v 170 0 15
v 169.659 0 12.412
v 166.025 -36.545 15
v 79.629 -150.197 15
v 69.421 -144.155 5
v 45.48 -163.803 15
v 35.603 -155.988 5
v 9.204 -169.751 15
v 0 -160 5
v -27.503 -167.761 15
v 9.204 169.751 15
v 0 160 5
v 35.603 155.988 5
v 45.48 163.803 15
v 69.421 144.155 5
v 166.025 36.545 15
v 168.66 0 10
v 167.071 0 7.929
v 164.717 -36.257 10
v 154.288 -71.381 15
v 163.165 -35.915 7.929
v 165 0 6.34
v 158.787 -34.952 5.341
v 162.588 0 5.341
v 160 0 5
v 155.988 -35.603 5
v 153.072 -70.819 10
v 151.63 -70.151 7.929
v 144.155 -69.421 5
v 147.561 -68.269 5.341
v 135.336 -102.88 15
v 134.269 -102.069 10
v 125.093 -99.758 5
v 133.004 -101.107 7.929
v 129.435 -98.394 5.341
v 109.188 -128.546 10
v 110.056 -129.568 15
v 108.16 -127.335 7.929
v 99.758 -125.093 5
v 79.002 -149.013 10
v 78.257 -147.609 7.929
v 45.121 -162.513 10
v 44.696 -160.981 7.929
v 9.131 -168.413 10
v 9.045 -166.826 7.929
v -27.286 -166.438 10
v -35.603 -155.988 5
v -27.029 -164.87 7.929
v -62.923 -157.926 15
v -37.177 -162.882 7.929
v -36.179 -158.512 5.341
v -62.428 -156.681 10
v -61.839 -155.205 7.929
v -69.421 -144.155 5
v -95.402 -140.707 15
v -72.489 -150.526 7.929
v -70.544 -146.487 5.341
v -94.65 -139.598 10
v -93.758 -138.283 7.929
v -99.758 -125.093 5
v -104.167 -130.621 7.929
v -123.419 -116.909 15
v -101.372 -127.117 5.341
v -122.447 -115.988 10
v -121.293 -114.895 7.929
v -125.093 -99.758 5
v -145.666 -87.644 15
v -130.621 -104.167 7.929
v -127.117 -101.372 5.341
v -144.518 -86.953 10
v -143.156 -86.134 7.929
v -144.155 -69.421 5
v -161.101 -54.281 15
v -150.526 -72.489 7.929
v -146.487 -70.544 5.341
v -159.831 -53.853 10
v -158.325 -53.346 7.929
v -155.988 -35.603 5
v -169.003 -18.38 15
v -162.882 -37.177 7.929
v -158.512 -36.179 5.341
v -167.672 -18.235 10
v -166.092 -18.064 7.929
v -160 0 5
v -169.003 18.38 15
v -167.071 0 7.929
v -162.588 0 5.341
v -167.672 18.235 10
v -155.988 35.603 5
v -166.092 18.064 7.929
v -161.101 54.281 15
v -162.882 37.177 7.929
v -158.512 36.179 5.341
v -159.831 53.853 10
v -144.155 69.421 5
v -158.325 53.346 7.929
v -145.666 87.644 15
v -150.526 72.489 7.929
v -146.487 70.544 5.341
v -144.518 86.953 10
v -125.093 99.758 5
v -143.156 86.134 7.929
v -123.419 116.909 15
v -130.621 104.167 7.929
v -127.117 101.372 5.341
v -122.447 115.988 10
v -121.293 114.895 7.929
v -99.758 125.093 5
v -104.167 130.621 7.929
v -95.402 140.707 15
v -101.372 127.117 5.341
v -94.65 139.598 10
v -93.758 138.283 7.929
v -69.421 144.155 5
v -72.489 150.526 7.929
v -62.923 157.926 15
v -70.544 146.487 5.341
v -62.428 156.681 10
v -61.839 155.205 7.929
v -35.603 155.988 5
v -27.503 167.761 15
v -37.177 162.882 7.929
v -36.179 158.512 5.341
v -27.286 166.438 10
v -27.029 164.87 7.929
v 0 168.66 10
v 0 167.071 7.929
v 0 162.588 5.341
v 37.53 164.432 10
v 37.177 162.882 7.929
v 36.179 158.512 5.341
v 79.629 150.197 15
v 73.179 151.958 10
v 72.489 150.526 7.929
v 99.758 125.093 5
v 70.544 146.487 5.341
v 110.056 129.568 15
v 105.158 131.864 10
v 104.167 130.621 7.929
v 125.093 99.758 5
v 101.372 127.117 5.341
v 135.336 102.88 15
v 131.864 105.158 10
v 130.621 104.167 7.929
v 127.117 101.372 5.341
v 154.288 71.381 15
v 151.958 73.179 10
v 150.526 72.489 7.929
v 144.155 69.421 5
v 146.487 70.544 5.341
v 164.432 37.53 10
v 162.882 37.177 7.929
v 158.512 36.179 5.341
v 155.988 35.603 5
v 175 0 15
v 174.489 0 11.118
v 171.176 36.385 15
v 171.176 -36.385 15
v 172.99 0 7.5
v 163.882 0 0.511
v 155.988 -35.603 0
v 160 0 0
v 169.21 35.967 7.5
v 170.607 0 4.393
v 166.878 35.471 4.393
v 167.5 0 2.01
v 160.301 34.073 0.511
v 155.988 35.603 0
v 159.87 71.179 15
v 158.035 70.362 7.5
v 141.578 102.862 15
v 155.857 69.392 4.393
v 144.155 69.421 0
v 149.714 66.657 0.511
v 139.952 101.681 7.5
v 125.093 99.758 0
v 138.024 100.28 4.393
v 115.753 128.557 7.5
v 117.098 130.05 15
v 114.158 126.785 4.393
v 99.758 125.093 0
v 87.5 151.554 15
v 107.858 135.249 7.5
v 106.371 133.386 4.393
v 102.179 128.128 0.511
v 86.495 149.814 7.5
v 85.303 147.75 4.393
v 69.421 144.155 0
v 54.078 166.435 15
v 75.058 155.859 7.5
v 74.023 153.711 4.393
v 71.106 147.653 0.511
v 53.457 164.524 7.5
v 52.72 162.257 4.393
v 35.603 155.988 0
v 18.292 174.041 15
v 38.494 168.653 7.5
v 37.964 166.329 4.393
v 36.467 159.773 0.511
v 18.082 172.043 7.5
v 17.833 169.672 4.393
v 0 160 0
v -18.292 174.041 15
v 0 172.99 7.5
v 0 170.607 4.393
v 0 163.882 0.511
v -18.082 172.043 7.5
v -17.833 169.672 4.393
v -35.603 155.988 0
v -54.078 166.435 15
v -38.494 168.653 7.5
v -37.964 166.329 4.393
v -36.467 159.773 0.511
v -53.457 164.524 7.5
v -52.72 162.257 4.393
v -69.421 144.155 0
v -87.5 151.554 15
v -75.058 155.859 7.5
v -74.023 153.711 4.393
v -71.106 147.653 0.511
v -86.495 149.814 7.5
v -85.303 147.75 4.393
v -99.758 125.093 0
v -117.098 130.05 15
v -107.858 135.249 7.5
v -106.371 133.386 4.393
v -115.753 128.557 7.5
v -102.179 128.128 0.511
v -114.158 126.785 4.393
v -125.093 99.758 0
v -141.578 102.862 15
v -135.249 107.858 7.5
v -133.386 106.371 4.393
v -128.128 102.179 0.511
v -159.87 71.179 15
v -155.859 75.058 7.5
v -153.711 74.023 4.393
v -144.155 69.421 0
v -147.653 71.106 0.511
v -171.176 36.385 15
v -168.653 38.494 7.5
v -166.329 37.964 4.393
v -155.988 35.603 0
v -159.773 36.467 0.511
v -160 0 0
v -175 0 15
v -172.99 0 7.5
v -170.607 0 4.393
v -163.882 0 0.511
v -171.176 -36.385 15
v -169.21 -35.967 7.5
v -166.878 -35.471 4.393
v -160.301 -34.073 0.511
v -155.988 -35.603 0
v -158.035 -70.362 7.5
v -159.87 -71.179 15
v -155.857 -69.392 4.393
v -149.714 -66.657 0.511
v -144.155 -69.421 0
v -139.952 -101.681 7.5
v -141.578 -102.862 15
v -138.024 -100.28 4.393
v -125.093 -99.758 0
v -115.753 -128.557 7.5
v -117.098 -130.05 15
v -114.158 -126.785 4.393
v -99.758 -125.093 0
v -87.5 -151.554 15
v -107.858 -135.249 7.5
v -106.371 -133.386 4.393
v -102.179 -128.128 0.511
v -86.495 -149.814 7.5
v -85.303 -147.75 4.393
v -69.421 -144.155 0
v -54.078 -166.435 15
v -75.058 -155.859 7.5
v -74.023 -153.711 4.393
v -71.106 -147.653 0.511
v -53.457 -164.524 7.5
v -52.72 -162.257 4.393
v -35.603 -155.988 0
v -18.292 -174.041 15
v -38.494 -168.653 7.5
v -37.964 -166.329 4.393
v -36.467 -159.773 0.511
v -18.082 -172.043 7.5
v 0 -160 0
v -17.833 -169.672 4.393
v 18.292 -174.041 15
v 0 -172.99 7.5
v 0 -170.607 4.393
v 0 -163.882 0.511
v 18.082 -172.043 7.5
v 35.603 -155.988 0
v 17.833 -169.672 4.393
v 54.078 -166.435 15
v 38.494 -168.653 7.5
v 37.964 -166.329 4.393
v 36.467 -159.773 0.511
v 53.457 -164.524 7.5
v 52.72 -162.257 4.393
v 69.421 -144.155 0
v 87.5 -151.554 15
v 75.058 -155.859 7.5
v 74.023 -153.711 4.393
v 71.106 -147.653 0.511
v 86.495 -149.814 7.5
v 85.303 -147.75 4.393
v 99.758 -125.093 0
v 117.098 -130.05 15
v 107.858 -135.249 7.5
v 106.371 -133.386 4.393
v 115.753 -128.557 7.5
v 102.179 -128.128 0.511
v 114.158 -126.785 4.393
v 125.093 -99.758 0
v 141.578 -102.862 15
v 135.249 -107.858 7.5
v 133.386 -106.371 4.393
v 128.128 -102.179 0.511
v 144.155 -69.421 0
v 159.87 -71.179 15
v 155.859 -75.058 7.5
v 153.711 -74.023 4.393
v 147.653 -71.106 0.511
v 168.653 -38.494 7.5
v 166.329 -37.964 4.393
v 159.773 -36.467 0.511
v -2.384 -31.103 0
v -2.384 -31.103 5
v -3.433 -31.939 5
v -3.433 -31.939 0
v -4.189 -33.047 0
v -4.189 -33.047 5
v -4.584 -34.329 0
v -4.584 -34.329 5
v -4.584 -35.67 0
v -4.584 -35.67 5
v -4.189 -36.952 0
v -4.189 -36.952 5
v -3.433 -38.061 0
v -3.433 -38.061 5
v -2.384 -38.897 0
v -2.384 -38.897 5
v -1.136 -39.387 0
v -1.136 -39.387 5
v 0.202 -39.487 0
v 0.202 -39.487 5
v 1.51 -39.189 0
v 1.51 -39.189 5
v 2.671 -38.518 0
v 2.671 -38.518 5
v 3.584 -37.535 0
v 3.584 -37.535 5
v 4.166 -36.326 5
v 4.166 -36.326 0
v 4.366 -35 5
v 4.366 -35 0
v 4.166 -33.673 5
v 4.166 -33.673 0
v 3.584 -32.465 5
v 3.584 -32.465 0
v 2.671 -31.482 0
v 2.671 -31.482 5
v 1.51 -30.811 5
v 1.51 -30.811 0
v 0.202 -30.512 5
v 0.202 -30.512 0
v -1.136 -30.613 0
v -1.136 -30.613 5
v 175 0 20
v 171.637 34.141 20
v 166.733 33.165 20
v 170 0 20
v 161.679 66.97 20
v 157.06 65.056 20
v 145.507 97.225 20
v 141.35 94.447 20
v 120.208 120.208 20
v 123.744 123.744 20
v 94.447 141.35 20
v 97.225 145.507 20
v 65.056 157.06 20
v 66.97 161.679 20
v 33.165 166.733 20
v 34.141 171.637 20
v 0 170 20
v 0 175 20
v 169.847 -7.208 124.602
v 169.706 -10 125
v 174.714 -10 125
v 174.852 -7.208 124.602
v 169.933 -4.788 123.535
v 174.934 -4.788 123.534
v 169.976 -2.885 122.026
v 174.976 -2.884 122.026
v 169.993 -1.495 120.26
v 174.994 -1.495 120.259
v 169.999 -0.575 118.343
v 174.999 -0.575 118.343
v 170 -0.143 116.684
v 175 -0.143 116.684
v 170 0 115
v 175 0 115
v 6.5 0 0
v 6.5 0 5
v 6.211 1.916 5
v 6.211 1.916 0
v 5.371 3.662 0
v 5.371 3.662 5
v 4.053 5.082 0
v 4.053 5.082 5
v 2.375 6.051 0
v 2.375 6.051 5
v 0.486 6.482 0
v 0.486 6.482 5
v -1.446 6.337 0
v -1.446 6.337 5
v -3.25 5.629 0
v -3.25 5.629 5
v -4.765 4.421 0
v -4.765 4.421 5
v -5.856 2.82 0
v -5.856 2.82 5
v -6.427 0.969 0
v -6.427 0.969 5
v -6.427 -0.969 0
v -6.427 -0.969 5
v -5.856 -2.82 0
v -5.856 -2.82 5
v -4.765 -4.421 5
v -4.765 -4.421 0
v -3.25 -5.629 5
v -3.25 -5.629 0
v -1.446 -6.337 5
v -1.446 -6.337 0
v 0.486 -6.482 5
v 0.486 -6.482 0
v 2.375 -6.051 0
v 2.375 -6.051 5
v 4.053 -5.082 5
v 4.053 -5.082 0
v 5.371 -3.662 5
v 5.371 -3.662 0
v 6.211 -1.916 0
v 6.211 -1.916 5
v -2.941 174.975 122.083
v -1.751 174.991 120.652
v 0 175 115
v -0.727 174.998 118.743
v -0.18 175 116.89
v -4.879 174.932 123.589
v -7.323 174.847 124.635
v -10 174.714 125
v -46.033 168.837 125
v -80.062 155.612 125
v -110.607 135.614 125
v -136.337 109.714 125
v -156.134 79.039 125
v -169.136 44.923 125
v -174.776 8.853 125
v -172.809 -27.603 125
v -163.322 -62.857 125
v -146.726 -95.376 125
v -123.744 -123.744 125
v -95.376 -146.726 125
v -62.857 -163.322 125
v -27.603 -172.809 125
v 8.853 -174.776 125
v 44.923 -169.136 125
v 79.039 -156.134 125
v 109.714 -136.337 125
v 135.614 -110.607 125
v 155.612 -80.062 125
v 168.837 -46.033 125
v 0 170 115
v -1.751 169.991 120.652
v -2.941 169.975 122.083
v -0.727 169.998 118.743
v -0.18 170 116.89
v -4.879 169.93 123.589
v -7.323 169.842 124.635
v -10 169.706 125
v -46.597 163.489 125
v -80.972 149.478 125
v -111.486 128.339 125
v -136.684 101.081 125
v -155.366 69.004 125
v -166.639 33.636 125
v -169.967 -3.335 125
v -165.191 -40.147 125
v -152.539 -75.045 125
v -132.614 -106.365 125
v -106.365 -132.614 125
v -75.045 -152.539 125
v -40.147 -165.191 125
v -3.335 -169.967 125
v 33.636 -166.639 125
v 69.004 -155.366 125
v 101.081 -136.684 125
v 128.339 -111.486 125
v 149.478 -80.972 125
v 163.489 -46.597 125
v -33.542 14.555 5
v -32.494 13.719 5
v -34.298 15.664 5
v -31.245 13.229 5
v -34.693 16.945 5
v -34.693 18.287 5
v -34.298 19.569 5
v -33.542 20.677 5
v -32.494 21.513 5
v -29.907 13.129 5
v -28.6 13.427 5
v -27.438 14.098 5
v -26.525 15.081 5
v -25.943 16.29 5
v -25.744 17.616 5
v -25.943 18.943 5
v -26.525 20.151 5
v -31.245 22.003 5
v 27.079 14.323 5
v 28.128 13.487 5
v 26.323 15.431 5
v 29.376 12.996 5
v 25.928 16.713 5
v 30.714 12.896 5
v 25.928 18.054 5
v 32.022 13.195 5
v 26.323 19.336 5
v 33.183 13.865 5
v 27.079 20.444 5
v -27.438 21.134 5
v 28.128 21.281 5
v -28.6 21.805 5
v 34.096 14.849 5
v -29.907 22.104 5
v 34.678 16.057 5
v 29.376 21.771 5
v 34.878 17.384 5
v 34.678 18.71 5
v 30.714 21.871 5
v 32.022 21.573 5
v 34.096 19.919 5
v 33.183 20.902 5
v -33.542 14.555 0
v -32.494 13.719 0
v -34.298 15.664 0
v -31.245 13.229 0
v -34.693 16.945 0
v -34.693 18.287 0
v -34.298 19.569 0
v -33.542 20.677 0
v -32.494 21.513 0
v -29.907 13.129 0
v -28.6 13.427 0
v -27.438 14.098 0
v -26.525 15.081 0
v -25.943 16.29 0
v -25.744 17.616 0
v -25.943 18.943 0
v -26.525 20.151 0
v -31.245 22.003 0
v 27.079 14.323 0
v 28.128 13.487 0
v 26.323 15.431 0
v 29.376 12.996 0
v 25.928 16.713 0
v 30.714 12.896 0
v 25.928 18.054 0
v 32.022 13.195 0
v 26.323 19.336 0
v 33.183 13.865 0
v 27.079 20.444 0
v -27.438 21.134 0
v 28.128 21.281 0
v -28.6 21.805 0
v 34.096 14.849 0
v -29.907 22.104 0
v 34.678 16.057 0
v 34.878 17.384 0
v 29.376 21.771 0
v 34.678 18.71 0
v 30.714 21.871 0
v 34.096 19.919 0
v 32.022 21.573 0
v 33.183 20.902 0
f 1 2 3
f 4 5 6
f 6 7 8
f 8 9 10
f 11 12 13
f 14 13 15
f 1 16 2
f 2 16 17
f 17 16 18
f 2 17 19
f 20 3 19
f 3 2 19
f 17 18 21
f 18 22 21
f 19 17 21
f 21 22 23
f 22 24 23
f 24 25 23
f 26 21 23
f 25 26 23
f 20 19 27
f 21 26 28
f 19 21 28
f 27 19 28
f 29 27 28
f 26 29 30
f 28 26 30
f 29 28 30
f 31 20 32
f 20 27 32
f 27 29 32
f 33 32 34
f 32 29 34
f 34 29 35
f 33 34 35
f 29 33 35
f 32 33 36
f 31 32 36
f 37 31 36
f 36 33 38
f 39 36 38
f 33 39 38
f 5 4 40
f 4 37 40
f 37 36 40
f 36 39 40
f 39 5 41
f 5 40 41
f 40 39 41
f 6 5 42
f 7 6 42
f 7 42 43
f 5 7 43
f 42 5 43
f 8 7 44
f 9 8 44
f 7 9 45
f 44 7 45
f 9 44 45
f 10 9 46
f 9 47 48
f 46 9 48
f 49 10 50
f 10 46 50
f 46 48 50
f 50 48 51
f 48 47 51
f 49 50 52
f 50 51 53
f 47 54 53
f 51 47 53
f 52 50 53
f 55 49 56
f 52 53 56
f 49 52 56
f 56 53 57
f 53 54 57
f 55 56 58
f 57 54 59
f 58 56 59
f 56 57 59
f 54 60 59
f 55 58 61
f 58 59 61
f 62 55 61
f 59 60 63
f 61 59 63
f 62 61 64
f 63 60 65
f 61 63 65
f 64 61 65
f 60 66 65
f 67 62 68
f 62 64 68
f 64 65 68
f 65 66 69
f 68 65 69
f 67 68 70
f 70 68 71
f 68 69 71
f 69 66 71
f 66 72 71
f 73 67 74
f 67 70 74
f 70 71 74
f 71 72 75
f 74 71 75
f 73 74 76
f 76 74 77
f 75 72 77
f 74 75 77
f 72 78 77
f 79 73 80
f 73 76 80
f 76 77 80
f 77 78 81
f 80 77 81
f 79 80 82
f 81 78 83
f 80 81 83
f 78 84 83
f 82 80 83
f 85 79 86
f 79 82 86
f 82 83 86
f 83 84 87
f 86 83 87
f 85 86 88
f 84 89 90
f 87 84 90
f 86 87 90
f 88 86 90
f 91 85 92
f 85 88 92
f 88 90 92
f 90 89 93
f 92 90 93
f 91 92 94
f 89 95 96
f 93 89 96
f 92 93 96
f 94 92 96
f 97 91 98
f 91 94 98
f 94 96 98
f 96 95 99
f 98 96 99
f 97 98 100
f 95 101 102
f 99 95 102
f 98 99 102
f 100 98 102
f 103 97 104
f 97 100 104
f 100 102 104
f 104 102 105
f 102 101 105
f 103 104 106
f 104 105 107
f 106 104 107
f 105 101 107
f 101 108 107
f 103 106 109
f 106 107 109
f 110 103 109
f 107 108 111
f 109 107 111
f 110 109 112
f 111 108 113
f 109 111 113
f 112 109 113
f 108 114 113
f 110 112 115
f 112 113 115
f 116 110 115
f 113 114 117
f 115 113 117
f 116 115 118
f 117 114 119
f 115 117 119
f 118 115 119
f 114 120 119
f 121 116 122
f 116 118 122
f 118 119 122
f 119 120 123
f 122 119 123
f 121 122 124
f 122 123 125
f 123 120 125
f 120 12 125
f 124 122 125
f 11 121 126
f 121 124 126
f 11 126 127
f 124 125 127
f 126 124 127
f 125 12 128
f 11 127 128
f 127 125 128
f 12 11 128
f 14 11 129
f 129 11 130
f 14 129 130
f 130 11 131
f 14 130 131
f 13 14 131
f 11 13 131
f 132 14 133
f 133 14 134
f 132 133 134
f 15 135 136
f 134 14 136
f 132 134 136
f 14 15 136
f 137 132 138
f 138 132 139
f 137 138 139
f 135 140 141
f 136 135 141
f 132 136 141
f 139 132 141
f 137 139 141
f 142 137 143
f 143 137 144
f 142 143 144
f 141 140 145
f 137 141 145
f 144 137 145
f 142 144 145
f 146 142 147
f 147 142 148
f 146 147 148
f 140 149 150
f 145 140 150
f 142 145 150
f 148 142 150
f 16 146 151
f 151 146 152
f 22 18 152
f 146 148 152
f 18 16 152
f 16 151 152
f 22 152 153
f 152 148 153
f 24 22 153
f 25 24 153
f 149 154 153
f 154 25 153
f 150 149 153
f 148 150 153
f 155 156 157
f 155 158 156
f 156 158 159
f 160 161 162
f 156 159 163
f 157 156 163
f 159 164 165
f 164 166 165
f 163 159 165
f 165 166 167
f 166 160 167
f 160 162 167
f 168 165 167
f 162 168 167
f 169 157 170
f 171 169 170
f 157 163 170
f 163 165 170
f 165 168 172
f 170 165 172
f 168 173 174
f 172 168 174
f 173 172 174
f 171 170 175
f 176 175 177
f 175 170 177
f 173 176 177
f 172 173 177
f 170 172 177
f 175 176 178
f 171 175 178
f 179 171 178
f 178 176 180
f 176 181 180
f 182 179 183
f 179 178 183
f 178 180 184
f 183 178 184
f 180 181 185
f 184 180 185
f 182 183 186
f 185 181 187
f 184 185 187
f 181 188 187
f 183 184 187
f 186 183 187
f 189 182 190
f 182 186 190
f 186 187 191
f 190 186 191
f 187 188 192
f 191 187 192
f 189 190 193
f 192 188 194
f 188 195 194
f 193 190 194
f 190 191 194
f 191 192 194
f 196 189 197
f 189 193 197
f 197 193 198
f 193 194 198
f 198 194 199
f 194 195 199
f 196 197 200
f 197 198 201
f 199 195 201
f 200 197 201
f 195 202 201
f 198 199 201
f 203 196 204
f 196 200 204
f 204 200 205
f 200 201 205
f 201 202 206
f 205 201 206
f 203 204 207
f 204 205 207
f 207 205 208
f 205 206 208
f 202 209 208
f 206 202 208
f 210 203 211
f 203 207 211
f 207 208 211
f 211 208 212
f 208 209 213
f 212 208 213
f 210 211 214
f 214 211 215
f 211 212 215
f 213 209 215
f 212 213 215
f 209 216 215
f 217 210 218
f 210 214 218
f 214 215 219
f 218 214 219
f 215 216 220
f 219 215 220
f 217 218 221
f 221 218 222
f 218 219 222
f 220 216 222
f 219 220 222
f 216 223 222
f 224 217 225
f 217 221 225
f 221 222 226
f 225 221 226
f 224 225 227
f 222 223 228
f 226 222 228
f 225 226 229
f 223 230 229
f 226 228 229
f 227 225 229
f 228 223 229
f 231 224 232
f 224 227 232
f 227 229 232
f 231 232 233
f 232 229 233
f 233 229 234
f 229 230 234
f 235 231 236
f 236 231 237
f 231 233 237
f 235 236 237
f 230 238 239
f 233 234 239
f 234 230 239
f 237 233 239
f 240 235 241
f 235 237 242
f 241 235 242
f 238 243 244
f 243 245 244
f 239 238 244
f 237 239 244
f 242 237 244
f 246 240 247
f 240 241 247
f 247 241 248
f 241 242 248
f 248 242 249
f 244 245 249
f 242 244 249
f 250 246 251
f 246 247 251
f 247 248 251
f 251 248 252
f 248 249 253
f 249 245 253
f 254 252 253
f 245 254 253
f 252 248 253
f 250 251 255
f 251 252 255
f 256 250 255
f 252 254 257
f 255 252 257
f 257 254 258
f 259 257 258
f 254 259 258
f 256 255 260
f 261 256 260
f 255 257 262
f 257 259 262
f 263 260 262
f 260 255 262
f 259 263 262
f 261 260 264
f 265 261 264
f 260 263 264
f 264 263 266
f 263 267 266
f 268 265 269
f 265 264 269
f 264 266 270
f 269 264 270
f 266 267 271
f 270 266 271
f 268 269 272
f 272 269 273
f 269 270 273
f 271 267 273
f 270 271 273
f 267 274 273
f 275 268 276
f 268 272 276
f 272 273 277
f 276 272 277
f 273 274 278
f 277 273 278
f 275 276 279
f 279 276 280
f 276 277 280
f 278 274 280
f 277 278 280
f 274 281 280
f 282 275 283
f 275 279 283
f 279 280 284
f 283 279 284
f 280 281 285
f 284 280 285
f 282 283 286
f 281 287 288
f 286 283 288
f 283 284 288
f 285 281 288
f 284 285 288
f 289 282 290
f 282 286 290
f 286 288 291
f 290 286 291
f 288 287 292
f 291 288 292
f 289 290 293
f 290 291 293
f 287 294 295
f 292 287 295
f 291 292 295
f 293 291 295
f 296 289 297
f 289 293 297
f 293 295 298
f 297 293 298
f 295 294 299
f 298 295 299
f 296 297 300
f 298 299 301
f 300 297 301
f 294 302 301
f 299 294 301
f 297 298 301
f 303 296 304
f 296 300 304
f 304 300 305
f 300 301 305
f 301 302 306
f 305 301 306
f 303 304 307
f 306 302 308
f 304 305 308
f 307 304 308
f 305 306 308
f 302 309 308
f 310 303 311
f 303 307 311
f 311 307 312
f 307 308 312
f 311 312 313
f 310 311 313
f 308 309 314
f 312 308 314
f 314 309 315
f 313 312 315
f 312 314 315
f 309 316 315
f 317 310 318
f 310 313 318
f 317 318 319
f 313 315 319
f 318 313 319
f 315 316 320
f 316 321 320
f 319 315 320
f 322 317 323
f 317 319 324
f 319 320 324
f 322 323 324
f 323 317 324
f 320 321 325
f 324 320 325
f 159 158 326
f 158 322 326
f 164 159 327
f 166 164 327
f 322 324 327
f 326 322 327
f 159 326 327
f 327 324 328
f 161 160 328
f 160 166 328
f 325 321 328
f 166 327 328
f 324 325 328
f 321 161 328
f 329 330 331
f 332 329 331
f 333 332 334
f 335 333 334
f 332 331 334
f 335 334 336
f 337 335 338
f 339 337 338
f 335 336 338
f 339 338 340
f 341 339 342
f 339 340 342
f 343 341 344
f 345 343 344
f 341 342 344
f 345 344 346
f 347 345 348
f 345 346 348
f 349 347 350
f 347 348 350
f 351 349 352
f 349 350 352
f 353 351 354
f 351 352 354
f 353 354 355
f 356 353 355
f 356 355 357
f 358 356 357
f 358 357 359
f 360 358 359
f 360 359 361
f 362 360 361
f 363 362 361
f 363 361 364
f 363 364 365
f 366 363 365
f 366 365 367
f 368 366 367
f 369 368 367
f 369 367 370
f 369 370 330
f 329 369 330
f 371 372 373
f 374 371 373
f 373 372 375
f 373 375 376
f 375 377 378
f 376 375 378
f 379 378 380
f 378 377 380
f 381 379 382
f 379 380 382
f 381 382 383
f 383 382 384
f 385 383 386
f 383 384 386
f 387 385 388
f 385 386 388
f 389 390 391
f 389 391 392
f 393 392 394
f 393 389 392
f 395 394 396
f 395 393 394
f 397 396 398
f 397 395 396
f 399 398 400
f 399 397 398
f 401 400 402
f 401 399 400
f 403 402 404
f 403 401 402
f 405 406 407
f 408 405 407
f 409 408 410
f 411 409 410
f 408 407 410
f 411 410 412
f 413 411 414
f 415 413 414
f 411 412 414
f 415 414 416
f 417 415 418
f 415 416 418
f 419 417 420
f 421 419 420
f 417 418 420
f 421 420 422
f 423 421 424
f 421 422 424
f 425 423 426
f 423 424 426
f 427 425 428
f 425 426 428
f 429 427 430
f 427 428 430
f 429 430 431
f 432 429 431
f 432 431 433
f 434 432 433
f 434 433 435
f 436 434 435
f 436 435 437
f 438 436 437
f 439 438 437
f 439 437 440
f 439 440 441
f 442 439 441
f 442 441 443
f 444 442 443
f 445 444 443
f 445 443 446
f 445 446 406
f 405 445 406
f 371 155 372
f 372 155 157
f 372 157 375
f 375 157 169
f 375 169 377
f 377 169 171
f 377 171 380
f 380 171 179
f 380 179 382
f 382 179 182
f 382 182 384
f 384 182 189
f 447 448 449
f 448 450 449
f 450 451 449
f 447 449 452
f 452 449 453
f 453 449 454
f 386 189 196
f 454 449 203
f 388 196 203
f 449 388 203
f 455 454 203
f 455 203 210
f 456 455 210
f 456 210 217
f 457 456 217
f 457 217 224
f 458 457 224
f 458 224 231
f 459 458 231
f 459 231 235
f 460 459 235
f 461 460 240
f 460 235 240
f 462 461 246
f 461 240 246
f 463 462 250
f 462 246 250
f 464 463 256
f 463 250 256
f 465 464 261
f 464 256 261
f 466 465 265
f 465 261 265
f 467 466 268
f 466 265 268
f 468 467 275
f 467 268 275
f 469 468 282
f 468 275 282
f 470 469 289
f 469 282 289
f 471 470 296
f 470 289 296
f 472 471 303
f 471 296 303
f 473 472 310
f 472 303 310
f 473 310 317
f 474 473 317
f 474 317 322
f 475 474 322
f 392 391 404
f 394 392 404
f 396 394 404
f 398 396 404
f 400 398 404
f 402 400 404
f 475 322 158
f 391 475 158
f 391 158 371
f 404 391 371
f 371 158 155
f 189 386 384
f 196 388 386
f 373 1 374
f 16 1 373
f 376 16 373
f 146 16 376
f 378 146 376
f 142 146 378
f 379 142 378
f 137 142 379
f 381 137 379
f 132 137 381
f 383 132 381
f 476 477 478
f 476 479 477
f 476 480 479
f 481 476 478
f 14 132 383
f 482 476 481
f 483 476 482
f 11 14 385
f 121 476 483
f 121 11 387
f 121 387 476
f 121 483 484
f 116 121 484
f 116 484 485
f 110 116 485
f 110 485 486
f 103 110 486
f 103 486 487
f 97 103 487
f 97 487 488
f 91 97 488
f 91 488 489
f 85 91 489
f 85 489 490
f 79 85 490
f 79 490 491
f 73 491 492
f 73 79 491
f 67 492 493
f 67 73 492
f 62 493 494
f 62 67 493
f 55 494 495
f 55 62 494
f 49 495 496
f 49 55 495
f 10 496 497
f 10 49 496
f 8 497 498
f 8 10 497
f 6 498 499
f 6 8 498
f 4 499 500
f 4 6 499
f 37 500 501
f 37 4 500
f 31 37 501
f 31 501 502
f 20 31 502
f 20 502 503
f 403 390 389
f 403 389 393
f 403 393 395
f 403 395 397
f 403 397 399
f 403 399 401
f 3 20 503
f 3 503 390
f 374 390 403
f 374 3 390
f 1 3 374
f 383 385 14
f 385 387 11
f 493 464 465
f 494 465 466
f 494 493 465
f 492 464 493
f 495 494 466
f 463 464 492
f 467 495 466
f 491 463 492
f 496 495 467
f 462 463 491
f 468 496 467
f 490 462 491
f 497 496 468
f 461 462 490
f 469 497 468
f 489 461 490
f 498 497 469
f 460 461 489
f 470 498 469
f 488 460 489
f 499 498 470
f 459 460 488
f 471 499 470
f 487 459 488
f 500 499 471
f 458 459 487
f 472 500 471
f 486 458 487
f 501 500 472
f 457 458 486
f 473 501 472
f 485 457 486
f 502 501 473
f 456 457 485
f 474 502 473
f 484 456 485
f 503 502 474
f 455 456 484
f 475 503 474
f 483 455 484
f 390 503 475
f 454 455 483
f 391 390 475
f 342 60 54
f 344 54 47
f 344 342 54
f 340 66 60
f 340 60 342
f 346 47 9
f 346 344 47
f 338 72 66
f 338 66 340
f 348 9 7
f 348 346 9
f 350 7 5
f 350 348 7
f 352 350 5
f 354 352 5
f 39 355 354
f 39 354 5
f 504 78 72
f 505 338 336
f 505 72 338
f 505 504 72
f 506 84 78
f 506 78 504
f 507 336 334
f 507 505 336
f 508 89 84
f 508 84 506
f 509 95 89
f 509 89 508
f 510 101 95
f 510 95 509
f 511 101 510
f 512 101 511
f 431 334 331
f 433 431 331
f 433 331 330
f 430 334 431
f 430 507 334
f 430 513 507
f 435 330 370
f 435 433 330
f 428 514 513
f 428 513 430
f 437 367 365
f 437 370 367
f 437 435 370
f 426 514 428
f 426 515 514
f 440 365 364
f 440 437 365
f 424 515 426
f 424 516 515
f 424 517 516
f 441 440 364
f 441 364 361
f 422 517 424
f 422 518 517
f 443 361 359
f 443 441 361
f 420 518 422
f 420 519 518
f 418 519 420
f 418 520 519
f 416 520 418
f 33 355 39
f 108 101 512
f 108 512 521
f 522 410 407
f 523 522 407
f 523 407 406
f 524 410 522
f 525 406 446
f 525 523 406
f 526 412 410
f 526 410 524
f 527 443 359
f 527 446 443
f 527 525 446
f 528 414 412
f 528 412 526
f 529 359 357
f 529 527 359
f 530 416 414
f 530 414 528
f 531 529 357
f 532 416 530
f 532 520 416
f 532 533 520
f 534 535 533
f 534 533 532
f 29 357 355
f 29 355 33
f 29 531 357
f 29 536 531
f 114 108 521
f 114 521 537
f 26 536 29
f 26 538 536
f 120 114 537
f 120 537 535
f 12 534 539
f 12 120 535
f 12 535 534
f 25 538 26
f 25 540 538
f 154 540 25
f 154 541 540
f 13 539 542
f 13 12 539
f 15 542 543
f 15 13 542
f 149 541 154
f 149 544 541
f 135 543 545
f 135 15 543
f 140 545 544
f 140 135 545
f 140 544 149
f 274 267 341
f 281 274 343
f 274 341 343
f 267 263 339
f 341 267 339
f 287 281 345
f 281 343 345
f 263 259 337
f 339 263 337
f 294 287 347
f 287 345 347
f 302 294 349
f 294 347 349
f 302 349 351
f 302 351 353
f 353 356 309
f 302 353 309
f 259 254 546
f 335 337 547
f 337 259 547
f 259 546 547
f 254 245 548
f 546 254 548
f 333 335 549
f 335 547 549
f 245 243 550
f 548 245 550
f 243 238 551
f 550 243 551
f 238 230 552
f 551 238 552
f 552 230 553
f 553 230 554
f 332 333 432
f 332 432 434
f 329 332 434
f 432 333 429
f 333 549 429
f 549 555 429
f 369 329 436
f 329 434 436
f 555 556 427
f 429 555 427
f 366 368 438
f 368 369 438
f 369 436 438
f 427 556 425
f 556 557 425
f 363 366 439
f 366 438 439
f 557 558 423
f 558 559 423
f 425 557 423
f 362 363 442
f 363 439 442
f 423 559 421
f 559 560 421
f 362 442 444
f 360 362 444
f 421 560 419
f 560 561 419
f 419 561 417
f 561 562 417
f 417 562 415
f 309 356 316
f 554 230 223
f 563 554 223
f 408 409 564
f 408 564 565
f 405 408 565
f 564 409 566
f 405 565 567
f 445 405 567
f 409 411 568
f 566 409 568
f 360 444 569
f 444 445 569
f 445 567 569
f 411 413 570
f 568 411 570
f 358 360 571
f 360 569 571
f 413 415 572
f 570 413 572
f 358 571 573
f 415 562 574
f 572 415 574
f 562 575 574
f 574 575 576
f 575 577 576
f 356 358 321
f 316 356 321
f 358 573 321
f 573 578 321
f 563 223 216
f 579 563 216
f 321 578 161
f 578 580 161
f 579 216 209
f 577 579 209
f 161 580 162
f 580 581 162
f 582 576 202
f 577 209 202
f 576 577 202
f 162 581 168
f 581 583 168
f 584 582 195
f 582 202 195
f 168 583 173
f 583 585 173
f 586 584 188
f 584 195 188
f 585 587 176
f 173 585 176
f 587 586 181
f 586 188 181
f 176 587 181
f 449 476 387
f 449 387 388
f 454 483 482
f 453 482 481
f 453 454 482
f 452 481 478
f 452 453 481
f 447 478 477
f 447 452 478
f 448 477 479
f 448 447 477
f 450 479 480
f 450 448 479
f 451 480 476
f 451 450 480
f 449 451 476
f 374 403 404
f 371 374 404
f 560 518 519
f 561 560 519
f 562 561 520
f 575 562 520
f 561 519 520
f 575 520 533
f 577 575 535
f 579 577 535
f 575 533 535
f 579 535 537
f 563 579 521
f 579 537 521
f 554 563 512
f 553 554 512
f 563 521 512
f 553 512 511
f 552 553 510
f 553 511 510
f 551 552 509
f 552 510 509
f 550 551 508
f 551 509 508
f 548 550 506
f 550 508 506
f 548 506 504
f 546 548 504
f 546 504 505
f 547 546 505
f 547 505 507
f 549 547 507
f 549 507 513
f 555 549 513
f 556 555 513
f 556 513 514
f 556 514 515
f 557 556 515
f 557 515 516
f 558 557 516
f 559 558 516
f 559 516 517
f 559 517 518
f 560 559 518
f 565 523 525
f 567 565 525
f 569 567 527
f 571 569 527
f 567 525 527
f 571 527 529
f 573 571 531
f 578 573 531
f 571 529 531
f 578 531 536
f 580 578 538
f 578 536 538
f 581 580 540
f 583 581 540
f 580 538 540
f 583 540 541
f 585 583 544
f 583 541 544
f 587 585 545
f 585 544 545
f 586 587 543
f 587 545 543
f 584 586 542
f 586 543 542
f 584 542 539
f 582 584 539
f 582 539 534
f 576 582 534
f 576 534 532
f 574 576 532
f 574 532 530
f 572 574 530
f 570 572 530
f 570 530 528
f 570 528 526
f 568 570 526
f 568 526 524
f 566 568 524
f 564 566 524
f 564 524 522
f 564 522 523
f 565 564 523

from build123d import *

# Parameters (mm, degrees)
SKETCH_1_R               = 175
EXTRUDE_1_DEPTH          = 125
SHELL_3_T                = -5
SKETCH_2_W               = 5
SKETCH_2_H               = 105
CUT_REVOLVE_1_ANGLE      = 90
FILLET_1_R               = 10
FILLET_2_R               = 15
SKETCH_3_R               = 6.5
CUT_EXTRUDE_1_DEPTH      = 125
FILLET_3_R               = 10
FILLET_START             = 169
FILLET_4_DEPTH           = 7
SKETCH_5_R               = 4.5
CUT_EXTRUDE_2_DEPTH      = 125
PATTERN_CIRCULAR_1_COUNT = 3


with BuildPart() as part:
    # 草图1 → 凸台-拉伸1 (new body)
    with BuildSketch(Plane.XY):
        Circle(SKETCH_1_R)
    extrude(amount=EXTRUDE_1_DEPTH)

    # 抽壳3
    shell_3_openings = [part.faces().sort_by_distance(p)[0] for p in [
        (0, 0, 125),
    ]]
    offset(amount=SHELL_3_T, openings=shell_3_openings, kind=Kind.INTERSECTION)

    # 草图2 → 切除-旋转1 (revolve, cut)
    with BuildSketch(Plane(origin=(0, 0, 0), x_dir=(1, 0, 0), z_dir=(0, 1, 0))):
        with Locations((172.5, -72.5)):
            Rectangle(SKETCH_2_W, SKETCH_2_H)
    revolve(axis=Axis((0, 0, 0), (0, 0, 1)), revolution_arc=CUT_REVOLVE_1_ANGLE, mode=Mode.SUBTRACT)

    # 圆角1
    fillet_1_edges = [part.edges().sort_by_distance(p)[0] for p in [
        (-170, 0, 5),
    ]]
    fillet(fillet_1_edges, radius=FILLET_1_R)

    # 圆角2
    fillet_2_edges = [part.edges().sort_by_distance(p)[0] for p in [
        (-175, 0, 0),
    ]]
    fillet(fillet_2_edges, radius=FILLET_2_R)

    # 草图3 → 切除-拉伸1 (cut)
    with BuildSketch(Plane.XY.offset(5)):
        Circle(SKETCH_3_R)
    extrude(amount=-CUT_EXTRUDE_1_DEPTH, mode=Mode.SUBTRACT)

    # 圆角3
    fillet_3_edges = [part.edges().sort_by_distance(p)[0] for p in [
        (0, 172.5, 125),
    ]]
    fillet(fillet_3_edges, radius=FILLET_3_R)

    # 圆角4: read off the stored shape, not the designer's step
    # 圆角4 outline → 圆角4 (cut)
    with BuildSketch(Plane.YZ.offset(FILLET_START)):
        with BuildLine():
            ThreePointArc((-10, 125), (-2.928932188, 122.071067812), (0, 115))
            Line((0, 115), (0, 125))
            Line((0, 125), (-10, 125))
        make_face()
    extrude(amount=FILLET_4_DEPTH, mode=Mode.SUBTRACT)

    # 草图5 → 切除-拉伸2 (cut)
    with BuildSketch(Plane.XY.offset(5)):
        with Locations((-30.243552325, 17.616115995)):
            Circle(SKETCH_5_R)
    cut_extrude_2 = extrude(amount=-CUT_EXTRUDE_2_DEPTH, mode=Mode.SUBTRACT)

    # 阵列(圆周)1: 切除-拉伸2 ×3 about axis
    pattern_circular_1_axis = Axis((0, 0, 0), (0, 0, 1))
    for i in range(1, PATTERN_CIRCULAR_1_COUNT):
        add(cut_extrude_2.rotate(pattern_circular_1_axis, i * 360 / PATTERN_CIRCULAR_1_COUNT), mode=Mode.SUBTRACT)


solid = part.part
